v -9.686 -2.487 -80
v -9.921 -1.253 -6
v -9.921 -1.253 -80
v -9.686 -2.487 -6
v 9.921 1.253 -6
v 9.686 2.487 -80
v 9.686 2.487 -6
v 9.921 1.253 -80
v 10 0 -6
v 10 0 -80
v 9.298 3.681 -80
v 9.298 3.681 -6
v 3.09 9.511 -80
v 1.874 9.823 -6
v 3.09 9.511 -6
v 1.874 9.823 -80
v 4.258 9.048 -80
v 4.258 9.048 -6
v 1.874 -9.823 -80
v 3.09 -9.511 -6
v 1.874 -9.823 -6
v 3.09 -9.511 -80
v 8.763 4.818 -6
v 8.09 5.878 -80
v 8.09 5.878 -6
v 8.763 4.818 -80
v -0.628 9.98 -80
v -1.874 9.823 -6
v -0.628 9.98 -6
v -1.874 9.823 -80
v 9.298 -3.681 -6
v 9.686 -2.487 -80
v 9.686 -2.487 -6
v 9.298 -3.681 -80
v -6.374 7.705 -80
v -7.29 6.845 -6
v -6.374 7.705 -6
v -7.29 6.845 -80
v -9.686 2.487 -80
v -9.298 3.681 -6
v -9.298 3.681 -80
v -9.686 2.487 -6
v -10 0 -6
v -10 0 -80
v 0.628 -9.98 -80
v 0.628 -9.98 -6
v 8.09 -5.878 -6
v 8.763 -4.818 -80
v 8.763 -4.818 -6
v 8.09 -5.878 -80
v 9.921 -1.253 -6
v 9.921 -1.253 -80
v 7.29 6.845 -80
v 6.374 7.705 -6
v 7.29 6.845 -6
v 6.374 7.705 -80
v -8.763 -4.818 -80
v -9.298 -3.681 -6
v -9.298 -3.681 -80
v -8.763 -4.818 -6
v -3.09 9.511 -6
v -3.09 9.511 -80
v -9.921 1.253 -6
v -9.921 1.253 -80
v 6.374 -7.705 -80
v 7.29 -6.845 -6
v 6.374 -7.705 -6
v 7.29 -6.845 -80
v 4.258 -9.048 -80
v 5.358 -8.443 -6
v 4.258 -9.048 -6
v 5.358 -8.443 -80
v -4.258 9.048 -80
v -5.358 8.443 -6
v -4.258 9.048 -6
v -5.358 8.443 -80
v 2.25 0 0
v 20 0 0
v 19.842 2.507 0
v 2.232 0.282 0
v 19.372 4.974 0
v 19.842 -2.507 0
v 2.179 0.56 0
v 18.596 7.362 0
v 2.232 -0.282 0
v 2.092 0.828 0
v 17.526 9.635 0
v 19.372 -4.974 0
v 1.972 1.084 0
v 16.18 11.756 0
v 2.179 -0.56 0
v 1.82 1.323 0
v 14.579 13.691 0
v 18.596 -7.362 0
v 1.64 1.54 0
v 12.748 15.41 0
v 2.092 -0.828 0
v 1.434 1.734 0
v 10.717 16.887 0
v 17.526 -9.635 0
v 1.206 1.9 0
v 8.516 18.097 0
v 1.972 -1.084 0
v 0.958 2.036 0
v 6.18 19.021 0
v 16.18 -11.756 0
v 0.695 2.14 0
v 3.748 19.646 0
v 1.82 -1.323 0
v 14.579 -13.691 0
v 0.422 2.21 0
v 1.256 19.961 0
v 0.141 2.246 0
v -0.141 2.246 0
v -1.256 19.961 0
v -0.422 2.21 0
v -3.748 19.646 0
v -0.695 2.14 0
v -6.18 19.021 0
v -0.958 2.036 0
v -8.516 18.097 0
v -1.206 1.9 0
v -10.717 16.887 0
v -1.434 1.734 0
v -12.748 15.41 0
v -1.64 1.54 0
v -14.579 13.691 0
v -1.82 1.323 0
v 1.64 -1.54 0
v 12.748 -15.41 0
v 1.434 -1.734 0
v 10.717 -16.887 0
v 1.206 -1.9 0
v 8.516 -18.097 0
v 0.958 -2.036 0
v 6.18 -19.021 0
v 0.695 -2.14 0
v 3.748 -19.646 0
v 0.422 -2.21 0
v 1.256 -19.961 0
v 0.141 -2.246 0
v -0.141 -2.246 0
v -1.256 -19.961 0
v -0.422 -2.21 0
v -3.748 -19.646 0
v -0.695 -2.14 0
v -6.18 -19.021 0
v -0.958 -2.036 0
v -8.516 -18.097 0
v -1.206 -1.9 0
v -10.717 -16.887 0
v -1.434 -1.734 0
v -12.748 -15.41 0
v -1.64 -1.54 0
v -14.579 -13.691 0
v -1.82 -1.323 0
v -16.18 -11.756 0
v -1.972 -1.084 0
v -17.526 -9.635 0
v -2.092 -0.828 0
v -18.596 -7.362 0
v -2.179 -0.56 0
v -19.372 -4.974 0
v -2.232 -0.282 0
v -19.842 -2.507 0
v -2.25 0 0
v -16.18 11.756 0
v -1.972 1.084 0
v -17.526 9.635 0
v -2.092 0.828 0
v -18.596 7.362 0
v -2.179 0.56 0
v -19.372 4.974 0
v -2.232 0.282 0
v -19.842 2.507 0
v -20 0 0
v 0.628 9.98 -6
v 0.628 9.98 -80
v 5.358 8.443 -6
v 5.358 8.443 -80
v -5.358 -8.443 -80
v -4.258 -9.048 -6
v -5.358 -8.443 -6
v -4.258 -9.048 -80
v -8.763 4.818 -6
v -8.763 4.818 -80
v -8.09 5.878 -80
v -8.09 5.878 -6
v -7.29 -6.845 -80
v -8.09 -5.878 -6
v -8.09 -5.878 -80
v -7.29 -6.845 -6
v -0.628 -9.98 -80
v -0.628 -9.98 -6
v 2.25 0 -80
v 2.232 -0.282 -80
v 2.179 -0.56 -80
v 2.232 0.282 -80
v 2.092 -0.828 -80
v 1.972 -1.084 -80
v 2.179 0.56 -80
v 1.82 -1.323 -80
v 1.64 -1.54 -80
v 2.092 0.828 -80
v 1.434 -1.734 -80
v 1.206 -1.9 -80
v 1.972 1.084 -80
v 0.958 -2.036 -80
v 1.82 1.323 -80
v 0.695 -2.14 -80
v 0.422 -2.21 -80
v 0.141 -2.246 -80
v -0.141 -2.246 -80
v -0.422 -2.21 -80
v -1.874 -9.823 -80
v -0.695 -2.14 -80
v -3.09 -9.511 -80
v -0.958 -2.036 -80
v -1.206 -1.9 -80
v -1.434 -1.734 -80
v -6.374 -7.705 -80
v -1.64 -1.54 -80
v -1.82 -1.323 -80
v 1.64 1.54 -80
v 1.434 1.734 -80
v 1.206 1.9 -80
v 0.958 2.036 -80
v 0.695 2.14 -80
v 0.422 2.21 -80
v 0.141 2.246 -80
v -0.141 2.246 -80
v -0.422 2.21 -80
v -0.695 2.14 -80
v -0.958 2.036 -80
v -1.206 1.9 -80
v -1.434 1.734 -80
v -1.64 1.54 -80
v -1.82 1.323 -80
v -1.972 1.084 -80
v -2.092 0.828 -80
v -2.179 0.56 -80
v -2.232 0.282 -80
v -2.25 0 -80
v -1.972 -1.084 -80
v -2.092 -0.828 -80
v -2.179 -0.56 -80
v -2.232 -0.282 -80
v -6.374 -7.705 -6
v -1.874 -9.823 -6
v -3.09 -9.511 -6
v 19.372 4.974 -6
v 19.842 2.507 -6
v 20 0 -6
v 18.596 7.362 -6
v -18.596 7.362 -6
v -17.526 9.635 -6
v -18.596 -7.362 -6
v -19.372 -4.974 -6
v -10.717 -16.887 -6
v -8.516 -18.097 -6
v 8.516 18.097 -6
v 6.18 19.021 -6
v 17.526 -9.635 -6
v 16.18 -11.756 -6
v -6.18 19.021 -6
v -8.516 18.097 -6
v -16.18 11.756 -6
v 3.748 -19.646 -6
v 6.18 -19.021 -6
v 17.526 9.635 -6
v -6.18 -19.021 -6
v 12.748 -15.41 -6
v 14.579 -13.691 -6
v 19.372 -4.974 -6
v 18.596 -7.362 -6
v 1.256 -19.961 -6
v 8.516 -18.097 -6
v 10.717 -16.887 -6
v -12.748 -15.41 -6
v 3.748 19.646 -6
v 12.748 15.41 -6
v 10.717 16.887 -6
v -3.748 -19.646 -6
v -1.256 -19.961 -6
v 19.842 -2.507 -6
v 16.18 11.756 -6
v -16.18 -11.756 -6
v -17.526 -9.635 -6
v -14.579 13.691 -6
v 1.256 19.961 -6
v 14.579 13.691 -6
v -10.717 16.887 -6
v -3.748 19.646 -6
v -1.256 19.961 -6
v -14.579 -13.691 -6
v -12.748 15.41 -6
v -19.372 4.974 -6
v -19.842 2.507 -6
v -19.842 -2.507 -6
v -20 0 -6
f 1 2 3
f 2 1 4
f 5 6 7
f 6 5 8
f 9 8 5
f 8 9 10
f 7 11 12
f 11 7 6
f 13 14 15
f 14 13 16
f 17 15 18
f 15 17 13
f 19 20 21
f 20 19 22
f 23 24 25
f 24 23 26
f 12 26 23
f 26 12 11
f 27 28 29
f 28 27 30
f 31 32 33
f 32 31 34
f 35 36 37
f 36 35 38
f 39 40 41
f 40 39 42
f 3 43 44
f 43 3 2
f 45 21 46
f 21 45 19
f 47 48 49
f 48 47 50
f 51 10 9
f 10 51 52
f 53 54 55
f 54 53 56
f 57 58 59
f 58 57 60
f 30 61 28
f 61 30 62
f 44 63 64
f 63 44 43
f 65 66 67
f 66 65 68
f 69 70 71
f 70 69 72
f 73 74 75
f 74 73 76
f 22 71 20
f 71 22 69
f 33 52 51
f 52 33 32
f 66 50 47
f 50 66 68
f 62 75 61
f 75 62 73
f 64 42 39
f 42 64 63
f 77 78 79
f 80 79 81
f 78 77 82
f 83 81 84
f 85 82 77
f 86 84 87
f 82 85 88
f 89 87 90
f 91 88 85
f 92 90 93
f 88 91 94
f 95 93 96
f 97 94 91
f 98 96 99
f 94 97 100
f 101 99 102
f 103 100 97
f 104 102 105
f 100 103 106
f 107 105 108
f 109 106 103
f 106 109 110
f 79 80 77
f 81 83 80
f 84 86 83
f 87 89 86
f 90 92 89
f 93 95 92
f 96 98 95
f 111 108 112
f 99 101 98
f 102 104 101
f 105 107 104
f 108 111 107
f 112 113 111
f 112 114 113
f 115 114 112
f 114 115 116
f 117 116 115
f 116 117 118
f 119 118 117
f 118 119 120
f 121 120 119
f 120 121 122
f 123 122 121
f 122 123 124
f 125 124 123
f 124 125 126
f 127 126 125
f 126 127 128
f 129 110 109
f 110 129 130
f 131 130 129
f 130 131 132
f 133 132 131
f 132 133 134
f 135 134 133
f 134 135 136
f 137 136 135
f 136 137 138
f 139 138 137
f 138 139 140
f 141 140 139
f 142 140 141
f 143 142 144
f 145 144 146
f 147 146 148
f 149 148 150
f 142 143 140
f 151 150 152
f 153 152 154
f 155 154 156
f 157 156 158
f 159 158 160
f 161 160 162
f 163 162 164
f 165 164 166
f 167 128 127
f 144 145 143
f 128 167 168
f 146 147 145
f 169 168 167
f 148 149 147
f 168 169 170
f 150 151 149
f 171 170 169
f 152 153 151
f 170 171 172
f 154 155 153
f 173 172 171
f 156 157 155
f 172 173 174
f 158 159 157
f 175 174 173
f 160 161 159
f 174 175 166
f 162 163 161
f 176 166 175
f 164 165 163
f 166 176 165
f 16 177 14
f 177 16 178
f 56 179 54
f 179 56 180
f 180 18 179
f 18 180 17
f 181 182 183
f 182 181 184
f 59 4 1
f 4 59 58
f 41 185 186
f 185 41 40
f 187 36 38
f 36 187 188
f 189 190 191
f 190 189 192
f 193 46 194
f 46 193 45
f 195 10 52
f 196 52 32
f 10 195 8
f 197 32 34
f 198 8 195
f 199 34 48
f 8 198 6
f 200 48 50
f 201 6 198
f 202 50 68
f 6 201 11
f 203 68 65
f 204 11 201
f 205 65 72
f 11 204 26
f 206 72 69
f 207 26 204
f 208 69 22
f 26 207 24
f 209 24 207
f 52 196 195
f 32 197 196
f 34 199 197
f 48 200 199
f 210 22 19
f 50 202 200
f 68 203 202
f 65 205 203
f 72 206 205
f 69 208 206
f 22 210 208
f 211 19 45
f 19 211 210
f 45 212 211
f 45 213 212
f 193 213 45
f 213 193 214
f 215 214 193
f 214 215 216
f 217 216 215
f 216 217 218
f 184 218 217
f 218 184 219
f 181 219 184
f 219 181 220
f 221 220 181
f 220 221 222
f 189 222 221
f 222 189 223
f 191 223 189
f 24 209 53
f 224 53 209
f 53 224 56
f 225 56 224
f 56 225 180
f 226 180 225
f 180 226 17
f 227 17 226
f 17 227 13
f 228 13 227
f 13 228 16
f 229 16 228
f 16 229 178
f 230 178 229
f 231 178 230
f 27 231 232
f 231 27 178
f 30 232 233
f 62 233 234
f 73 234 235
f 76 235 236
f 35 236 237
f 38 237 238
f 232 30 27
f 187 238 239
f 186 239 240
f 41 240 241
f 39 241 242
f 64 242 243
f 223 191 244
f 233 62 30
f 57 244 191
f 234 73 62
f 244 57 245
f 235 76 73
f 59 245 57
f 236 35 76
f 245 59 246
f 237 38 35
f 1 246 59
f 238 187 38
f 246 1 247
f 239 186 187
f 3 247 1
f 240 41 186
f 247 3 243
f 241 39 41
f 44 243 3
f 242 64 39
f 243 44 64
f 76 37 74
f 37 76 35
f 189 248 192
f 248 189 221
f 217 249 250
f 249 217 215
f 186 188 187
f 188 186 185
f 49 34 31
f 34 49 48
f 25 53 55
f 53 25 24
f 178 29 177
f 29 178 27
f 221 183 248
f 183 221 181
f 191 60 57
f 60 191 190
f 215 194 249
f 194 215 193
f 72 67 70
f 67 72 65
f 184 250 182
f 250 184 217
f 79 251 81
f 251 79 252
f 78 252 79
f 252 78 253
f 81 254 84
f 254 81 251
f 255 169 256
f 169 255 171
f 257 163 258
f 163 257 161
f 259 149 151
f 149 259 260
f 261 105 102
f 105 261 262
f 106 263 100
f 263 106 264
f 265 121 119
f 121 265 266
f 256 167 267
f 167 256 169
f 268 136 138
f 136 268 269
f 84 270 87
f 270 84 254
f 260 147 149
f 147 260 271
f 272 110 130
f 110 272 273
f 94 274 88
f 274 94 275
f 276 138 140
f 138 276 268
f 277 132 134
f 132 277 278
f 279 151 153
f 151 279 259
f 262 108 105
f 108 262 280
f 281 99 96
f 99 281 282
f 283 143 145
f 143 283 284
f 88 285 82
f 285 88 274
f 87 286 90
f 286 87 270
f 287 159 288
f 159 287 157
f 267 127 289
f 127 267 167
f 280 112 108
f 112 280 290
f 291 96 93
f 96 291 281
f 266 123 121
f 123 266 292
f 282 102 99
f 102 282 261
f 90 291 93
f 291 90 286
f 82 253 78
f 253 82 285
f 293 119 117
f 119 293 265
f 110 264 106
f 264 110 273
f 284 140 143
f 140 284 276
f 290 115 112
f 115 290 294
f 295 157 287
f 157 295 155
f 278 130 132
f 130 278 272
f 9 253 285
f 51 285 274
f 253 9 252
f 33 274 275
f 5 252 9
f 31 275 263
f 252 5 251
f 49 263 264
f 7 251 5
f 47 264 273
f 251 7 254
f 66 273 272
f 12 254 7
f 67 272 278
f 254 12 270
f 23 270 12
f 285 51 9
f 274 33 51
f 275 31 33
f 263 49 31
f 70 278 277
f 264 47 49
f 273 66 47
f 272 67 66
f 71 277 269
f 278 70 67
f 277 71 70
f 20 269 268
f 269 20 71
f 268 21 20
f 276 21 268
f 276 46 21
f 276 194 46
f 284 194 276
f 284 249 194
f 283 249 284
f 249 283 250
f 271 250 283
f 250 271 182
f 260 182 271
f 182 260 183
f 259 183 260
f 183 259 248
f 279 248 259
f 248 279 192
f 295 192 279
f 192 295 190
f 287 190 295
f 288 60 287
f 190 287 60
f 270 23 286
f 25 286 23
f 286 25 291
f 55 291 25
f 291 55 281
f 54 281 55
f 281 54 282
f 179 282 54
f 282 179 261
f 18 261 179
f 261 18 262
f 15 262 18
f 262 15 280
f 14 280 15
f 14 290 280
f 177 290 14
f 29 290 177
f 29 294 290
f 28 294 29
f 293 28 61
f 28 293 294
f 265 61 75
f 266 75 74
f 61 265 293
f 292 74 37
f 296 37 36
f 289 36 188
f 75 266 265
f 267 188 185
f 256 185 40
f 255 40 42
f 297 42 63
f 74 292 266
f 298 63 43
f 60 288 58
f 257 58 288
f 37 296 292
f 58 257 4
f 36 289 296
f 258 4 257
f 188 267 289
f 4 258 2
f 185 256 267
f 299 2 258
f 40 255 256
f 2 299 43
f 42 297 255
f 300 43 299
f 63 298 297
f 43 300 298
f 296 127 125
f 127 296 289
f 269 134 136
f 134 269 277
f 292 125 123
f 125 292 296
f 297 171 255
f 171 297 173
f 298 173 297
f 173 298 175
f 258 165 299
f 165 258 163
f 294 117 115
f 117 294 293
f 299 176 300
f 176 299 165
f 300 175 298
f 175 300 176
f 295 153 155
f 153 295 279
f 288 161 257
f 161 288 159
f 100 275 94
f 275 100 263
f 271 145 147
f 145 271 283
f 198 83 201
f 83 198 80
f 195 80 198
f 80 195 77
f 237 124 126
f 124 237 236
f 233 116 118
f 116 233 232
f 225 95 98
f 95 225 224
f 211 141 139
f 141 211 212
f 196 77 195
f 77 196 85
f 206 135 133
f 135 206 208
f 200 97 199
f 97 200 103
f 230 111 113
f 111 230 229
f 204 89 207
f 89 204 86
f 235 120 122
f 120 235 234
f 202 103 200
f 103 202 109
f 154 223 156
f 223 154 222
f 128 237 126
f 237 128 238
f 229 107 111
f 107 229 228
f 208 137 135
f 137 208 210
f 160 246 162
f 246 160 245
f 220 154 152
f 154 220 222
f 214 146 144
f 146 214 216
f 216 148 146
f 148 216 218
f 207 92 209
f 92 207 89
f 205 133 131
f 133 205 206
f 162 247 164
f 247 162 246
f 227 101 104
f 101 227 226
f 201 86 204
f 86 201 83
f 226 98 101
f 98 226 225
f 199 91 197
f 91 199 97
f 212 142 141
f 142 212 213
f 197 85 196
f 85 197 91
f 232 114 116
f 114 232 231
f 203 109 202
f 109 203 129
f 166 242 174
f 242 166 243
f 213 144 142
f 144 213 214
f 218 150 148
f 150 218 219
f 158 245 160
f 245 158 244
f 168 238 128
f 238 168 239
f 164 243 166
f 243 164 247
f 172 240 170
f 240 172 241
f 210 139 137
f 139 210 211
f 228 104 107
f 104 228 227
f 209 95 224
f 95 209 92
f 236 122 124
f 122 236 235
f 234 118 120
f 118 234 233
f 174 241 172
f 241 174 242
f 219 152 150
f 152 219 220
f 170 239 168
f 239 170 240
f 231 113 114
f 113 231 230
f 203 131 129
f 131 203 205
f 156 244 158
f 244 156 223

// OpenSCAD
$fn = 50;


difference() {
	union() {
		translate(v = [0, 0, -80.0000000000]) {
			cylinder(h = 80, r = 10.0000000000);
		}
		translate(v = [0, 0, -6.0000000000]) {
			cylinder(h = 6, r = 20.0000000000);
		}
	}
	union() {
		#translate(v = [0, 0, -80]) {
			cylinder(h = 80, r = 2.2500000000);
		}
	}
}
